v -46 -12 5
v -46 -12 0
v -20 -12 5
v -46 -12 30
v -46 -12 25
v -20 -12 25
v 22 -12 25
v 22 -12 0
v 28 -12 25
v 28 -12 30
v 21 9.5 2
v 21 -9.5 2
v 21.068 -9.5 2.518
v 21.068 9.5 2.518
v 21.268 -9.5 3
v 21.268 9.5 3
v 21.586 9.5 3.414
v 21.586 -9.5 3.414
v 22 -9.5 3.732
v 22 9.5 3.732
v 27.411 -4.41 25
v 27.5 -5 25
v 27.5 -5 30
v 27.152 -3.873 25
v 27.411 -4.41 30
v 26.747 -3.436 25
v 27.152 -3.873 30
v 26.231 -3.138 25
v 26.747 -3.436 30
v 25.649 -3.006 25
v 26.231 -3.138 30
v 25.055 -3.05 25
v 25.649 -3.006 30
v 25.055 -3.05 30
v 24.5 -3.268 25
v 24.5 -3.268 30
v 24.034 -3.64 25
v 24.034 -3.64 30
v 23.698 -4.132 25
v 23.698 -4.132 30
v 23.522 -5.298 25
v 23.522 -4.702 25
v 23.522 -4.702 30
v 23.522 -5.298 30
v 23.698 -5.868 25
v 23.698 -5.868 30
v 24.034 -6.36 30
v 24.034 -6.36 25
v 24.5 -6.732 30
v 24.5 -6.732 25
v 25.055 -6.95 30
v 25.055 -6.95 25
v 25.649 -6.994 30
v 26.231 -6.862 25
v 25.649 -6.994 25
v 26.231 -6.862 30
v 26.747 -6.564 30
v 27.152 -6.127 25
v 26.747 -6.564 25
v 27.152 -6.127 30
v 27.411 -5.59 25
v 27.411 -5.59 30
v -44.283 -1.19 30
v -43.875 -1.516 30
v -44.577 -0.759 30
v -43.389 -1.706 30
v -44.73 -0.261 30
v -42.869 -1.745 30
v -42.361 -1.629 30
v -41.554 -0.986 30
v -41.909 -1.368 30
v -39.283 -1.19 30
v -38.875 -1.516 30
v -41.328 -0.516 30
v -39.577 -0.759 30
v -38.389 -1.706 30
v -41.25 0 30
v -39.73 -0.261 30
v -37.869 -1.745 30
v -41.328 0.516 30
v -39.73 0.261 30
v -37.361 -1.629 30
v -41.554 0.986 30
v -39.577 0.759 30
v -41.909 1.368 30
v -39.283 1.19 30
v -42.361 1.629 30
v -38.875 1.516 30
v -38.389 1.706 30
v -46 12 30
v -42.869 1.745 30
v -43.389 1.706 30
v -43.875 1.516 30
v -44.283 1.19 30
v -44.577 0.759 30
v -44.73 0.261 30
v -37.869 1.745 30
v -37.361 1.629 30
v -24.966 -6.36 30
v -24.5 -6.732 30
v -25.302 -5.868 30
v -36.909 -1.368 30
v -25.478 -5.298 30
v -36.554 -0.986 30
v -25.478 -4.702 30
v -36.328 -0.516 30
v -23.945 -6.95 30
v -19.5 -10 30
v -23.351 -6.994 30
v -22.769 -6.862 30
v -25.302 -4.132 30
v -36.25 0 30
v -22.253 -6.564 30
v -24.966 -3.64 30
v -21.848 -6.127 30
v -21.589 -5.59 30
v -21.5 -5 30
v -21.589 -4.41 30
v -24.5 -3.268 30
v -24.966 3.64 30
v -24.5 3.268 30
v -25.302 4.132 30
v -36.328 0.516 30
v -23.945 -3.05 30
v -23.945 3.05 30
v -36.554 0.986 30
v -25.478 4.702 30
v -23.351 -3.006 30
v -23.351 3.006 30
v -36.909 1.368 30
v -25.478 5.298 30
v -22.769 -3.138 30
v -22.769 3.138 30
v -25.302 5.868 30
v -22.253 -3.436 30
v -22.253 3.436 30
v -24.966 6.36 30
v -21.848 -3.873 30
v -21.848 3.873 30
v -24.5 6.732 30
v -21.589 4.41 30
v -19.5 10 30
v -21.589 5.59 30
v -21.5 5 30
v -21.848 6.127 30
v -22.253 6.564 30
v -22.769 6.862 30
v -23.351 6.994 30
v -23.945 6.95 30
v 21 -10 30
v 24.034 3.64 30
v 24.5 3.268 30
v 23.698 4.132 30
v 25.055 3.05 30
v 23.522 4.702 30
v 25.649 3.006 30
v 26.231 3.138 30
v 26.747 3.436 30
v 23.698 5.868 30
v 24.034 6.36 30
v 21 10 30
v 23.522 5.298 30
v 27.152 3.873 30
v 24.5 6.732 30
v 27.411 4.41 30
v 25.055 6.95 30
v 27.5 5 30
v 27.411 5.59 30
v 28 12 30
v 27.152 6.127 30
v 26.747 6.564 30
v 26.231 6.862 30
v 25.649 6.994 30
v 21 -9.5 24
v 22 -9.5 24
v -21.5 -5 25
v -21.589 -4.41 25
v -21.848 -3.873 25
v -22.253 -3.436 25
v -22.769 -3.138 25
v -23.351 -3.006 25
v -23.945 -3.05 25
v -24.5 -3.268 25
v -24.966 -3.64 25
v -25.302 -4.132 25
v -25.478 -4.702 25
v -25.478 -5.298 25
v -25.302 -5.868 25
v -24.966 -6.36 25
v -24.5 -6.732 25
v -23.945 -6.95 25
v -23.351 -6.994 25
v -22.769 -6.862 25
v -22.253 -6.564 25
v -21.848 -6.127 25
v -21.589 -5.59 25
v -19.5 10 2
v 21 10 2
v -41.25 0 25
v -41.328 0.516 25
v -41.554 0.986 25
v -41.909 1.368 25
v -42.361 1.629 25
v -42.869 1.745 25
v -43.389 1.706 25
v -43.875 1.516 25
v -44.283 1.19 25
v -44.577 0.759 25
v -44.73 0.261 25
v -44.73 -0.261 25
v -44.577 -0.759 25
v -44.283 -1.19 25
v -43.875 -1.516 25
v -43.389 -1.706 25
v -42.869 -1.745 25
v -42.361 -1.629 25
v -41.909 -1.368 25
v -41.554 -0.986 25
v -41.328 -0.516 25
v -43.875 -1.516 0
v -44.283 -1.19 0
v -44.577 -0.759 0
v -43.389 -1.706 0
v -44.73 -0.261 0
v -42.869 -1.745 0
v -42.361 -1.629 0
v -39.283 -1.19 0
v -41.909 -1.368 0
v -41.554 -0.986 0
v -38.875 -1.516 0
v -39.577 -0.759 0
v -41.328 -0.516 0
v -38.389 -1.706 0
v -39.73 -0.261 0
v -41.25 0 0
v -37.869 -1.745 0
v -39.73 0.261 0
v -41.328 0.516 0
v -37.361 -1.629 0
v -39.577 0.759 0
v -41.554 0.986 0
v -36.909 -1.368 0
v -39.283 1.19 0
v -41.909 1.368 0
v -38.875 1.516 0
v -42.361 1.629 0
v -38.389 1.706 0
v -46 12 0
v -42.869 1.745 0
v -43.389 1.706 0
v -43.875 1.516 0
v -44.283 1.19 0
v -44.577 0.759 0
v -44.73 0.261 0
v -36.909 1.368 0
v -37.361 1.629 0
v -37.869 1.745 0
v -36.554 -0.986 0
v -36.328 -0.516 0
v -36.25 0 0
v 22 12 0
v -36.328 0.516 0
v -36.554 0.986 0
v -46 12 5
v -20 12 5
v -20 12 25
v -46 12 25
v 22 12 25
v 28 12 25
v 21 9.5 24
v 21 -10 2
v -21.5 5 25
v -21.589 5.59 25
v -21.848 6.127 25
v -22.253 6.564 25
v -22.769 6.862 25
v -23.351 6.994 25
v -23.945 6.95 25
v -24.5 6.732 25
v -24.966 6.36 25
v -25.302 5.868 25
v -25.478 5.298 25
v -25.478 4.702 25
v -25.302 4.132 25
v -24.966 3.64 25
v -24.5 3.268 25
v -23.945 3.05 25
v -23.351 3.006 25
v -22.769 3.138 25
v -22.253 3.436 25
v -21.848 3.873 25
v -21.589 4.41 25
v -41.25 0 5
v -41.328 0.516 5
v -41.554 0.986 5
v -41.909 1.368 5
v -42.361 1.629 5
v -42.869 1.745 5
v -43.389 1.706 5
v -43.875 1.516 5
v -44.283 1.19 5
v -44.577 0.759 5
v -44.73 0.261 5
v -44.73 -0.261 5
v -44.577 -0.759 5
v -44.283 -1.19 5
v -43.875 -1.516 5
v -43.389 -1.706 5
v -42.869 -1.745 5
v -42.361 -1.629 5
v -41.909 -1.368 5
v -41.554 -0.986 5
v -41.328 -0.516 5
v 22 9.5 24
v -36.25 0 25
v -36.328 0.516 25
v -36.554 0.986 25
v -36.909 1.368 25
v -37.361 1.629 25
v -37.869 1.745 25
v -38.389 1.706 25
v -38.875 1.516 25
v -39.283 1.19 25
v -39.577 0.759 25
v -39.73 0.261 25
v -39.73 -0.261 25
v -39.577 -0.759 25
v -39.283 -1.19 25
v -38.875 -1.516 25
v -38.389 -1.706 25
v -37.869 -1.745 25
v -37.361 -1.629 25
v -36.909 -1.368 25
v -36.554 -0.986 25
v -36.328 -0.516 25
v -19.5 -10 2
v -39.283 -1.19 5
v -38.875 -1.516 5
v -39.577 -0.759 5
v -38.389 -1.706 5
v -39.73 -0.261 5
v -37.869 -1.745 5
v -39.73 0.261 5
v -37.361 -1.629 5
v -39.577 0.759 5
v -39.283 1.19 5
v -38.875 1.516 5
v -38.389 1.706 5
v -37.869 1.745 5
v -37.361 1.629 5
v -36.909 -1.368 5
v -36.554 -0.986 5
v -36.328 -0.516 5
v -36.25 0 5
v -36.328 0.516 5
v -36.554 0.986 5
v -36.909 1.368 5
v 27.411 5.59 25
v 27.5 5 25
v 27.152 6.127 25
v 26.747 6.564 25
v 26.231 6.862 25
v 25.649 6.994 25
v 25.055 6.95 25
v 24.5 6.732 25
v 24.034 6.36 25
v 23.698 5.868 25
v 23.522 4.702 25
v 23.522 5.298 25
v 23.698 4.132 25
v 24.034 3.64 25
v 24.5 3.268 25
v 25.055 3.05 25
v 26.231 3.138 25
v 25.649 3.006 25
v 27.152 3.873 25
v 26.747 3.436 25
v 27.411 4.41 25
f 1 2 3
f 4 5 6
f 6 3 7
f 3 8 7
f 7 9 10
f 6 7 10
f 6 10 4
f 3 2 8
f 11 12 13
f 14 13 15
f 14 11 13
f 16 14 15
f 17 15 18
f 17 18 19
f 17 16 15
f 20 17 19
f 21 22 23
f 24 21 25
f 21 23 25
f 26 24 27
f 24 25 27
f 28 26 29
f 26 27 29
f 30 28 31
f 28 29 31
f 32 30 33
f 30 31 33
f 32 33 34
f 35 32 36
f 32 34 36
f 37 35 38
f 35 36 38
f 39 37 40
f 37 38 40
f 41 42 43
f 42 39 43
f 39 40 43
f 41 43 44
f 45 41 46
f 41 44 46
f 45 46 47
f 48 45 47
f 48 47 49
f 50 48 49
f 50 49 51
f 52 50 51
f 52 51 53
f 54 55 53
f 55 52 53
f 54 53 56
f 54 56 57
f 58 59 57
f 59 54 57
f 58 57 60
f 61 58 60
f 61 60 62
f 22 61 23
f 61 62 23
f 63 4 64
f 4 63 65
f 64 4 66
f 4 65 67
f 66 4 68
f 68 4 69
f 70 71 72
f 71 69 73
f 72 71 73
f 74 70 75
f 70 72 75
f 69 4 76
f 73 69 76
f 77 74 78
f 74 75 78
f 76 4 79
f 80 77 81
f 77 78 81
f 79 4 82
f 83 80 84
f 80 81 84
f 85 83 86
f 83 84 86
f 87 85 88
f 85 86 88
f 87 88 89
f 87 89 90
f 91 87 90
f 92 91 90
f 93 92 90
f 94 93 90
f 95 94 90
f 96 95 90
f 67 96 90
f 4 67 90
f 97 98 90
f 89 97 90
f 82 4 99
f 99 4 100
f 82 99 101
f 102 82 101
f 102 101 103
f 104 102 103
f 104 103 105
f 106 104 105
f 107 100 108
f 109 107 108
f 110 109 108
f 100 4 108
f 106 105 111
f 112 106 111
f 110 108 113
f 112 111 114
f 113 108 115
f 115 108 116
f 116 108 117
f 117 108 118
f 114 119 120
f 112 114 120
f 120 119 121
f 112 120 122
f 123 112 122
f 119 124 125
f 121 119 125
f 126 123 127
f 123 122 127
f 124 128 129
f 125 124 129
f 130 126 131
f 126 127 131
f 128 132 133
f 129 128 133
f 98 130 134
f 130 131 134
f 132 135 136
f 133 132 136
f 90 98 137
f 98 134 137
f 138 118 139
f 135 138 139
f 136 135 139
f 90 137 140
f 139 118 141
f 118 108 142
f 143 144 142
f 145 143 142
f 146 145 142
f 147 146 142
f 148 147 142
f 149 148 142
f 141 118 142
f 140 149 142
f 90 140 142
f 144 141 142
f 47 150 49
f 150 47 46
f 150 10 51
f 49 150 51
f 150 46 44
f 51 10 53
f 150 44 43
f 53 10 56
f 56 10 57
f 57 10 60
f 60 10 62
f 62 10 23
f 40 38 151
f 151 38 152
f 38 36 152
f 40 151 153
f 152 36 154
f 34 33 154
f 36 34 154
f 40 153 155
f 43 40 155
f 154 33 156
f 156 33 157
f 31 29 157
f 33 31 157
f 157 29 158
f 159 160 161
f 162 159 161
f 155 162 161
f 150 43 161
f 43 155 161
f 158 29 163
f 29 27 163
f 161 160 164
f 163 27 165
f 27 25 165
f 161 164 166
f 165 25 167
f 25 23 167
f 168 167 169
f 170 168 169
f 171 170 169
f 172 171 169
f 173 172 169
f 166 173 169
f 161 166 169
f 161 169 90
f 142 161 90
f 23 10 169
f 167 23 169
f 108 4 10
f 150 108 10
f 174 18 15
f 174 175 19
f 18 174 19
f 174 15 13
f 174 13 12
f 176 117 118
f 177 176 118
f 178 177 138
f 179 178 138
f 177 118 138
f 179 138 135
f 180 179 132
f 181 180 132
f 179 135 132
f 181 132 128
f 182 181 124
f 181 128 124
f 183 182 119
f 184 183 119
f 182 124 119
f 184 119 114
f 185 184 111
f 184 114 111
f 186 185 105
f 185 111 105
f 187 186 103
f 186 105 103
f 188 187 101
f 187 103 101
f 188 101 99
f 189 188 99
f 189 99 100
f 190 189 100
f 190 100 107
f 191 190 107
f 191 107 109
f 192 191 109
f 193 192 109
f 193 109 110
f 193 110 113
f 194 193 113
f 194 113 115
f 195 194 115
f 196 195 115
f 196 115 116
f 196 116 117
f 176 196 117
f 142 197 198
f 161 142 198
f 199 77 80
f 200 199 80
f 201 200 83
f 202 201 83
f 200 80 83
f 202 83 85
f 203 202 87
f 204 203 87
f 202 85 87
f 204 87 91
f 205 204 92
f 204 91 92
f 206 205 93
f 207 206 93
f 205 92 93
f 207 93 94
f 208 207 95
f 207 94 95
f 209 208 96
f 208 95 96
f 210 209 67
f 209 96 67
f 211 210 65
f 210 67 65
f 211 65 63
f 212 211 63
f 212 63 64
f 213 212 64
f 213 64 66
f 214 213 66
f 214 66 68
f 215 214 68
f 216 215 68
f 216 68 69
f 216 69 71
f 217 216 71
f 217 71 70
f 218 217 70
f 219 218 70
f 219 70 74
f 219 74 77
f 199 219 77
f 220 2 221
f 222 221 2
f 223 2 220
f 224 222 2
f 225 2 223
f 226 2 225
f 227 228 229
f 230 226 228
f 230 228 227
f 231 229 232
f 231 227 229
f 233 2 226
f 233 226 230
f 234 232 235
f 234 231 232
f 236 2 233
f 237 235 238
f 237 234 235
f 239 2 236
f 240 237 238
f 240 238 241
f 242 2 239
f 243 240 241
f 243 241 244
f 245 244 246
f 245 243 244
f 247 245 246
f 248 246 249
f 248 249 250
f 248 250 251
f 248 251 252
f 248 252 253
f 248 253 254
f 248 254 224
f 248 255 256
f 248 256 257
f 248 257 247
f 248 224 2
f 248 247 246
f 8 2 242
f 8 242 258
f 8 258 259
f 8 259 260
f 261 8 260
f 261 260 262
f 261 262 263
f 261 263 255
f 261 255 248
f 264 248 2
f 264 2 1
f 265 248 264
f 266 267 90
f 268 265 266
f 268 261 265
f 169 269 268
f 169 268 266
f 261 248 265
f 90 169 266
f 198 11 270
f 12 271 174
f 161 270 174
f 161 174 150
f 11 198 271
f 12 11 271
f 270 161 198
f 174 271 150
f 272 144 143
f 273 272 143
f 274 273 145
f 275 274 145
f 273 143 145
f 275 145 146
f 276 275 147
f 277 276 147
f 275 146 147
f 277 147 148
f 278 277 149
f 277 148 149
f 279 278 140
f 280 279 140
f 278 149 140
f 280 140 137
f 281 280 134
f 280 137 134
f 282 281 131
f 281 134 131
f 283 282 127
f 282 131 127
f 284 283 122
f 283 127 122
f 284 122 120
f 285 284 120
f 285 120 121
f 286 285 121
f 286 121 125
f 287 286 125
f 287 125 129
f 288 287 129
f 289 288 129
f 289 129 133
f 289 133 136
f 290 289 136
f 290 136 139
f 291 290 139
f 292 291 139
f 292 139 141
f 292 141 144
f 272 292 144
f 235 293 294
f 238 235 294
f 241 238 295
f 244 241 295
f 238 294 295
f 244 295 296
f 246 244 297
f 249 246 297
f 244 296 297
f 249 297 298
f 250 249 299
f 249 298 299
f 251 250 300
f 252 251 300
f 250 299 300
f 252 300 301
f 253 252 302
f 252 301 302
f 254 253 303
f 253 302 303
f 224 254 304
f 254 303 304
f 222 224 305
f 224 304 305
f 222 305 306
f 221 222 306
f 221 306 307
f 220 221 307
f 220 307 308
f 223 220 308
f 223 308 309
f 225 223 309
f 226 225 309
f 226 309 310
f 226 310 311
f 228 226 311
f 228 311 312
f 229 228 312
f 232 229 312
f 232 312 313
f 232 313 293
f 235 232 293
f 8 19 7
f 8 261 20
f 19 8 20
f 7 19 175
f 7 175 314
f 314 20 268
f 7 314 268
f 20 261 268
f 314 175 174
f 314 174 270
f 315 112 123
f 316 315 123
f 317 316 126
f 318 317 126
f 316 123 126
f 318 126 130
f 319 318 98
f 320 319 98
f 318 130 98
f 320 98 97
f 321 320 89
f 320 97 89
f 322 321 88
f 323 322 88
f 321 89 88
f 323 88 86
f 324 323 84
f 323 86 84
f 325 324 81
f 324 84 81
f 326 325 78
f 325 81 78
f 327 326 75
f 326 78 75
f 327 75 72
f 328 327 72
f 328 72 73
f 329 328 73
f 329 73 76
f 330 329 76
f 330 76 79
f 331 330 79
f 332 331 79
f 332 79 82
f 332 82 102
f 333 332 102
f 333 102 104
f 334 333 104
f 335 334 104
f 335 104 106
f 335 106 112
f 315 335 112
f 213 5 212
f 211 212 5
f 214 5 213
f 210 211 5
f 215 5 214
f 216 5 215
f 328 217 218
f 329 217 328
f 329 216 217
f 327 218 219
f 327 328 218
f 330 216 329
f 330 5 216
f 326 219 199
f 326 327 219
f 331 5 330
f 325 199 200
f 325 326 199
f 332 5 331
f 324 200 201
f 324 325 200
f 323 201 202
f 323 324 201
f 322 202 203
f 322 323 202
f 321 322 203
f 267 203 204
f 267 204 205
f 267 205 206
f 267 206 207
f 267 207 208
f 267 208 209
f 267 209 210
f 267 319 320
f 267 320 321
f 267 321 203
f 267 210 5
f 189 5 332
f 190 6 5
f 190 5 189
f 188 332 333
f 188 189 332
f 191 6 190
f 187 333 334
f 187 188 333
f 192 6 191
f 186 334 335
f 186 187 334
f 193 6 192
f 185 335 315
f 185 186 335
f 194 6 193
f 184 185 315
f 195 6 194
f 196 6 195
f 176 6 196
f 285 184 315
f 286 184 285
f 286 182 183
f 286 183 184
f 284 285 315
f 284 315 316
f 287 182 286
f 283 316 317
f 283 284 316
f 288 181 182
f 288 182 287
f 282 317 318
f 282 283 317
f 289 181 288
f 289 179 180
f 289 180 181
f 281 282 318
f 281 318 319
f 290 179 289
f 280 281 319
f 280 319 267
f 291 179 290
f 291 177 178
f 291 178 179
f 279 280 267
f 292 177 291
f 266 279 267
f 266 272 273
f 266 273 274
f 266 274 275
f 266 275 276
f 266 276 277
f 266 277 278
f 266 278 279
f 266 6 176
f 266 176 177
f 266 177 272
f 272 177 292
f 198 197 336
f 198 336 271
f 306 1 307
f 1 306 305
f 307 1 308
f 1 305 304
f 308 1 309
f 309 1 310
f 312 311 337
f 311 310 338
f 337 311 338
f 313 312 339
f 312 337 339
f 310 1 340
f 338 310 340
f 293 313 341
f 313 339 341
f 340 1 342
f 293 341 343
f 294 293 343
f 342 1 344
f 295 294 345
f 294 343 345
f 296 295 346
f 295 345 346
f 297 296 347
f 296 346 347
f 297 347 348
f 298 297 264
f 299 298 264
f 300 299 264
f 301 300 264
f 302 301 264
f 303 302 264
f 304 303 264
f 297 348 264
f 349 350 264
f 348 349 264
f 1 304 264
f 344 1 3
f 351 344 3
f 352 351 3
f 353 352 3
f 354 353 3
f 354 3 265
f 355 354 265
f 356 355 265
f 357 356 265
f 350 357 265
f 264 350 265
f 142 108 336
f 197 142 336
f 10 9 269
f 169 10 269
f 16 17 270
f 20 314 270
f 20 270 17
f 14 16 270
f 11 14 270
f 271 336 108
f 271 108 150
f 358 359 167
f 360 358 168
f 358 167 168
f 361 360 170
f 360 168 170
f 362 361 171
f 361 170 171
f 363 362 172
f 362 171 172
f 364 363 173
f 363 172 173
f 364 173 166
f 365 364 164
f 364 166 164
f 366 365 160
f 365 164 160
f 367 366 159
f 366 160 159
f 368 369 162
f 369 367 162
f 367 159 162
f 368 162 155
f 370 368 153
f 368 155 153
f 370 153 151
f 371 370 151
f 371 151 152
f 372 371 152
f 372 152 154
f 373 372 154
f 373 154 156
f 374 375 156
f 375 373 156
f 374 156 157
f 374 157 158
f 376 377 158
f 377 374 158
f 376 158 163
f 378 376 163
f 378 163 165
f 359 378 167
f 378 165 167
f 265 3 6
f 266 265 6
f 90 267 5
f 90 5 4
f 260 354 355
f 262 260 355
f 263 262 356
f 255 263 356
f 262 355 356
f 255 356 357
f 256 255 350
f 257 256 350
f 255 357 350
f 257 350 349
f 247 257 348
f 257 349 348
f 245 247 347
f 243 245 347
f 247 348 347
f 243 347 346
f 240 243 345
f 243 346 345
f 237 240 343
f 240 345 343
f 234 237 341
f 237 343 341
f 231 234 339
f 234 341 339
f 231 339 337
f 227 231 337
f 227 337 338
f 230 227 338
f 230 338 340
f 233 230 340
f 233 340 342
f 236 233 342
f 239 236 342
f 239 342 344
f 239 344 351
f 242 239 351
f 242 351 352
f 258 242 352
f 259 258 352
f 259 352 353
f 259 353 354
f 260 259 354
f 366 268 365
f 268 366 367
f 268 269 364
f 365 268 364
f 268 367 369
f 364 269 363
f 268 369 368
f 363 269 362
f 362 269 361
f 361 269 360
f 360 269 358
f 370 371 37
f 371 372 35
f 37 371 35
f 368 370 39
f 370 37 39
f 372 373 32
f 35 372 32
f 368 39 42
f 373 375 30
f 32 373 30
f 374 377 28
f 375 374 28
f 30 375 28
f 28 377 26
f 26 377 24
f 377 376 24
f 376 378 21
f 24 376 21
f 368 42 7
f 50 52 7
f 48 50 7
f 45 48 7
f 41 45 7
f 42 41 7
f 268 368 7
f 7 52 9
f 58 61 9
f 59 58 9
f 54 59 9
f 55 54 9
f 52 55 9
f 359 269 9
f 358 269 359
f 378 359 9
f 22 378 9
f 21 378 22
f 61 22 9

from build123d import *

# Parameters (mm, degrees)
SKETCH1_W                 = 56
SKETCH1_H                 = 24
BOSS_EXTRUDE1_DEPTH       = 30
SHELL1_T                  = -2
SHELL1_THICKNESS_2_FACE_W = 28
SHELL1_THICKNESS_2_FACE_H = 20
SHELL1_THICKNESS_2_DEPTH  = 6.5
SHELL1_THICKNESS_3_FACE_W = 28
SHELL1_THICKNESS_3_FACE_H = 20
SHELL1_THICKNESS_3_DEPTH  = 5
SKETCH12_W                = 20
SKETCH12_H                = 19
CUT_EXTRUDE1_DEPTH        = 10
FILLET1_R                 = 2
SKETCH13_W                = 2
SKETCH13_H                = 24
CUT_EXTRUDE2_DEPTH        = 43.755116653
SKETCH17_W                = 25
SKETCH17_H                = 24
CUT_EXTRUDE4_DEPTH        = 4
SKETCH19_R                = 2
CUT_EXTRUDE5_DEPTH        = 13
CUT_EXTRUDE7_DEPTH        = 2
SKETCH21_W                = 25
SKETCH21_H                = 24
CUT_EXTRUDE8_DEPTH        = 6
SKETCH26_W                = 5
SKETCH26_H                = 24
BOSS_EXTRUDE3_DEPTH       = 20
SKETCH27_W                = 5
SKETCH27_H                = 24
BOSS_EXTRUDE4_DEPTH       = 26
SKETCH28_R                = 1.75
CUT_EXTRUDE9_DEPTH        = 57.21387729


with BuildPart() as part:
    # Sketch1 → Boss-Extrude1 (new body)
    with BuildSketch(Plane.XY):
        Rectangle(SKETCH1_W, SKETCH1_H)
    extrude(amount=BOSS_EXTRUDE1_DEPTH)

    # Shell1
    shell1_openings = [part.faces().sort_by_distance(p)[0] for p in [
        (0, 0, 30),
    ]]
    offset(amount=SHELL1_T, openings=shell1_openings, kind=Kind.INTERSECTION)

    # Shell1 thickness 2 face (on inner face of the shell) → Shell1 thickness 2 (add)
    with BuildSketch(Plane(origin=(-26, 0, 16), x_dir=(0, 0, -1), z_dir=(-1, 0, 0))):
        Rectangle(SHELL1_THICKNESS_2_FACE_W, SHELL1_THICKNESS_2_FACE_H)
    extrude(amount=-SHELL1_THICKNESS_2_DEPTH)

    # Shell1 thickness 3 face (on inner face of the shell) → Shell1 thickness 3 (add)
    with BuildSketch(Plane(origin=(26, 0, 16), x_dir=(0, 0, 1), z_dir=(1, 0, 0))):
        Rectangle(SHELL1_THICKNESS_3_FACE_W, SHELL1_THICKNESS_3_FACE_H)
    extrude(amount=-SHELL1_THICKNESS_3_DEPTH)

    # Sketch12 → Cut-Extrude1 (cut)
    with BuildSketch(Plane(origin=(28, 0, 0), x_dir=(0, 0, -1), z_dir=(1, 0, 0))):
        with Locations((-14, 0)):
            Rectangle(SKETCH12_W, SKETCH12_H)
    extrude(amount=-CUT_EXTRUDE1_DEPTH, mode=Mode.SUBTRACT)

    # Fillet1
    fillet1_edges = [part.edges().sort_by_distance(p)[0] for p in [
        (21, 0, 4),
    ]]
    fillet(fillet1_edges, radius=FILLET1_R - 0.0001)  # a hair under: the kernel refuses the full size

    # Sketch13 → Cut-Extrude2 (cut, through all)
    with BuildSketch(Plane.XY.offset(30)):
        with Locations((-27, 0)):
            Rectangle(SKETCH13_W, SKETCH13_H)
    extrude(amount=-CUT_EXTRUDE2_DEPTH, mode=Mode.SUBTRACT)

    # Sketch17 → Cut-Extrude4 (cut)
    with BuildSketch(Plane(origin=(28, 0, 0), x_dir=(0, 0, -1), z_dir=(1, 0, 0))):
        with Locations((-12.5, 0)):
            Rectangle(SKETCH17_W, SKETCH17_H)
    extrude(amount=-CUT_EXTRUDE4_DEPTH, mode=Mode.SUBTRACT)

    # Sketch19 → Cut-Extrude5 (cut)
    with BuildSketch(Plane.XY.offset(30)):
        with Locations((-23.5, -5)):
            Circle(SKETCH19_R)
        with Locations((-23.5, 5)):
            Circle(SKETCH19_R)
        with Locations((25.5, 5)):
            Circle(SKETCH19_R)
        with Locations((25.5, -5)):
            Circle(SKETCH19_R)
    extrude(amount=-CUT_EXTRUDE5_DEPTH, mode=Mode.SUBTRACT)

    # Sketch20 → Cut-Extrude7 (cut)
    with BuildSketch(Plane(origin=(24, 0, 0), x_dir=(0, 0, -1), z_dir=(1, 0, 0))):
        Polygon((-25, 6.322875656), (-25, 12), (0, 12), (0, -12), (-25, -12), (-25, -6.322875656), align=None)
        Polygon((-24, -6.322875656), (-24, -9.5), (-4, -9.5), (-4, 9.5), (-24, 9.5), (-24, 6.322875656), align=None, mode=Mode.SUBTRACT)
    extrude(amount=-CUT_EXTRUDE7_DEPTH, mode=Mode.SUBTRACT)

    # Sketch21 → Cut-Extrude8 (cut)
    with BuildSketch(Plane.ZY.offset(26)):
        with Locations((12.5, 0)):
            Rectangle(SKETCH21_W, SKETCH21_H)
    extrude(amount=-CUT_EXTRUDE8_DEPTH, mode=Mode.SUBTRACT)

    # Sketch26 → Boss-Extrude3 (add)
    with BuildSketch(Plane.ZY.offset(26)):
        with Locations((27.5, 0)):
            Rectangle(SKETCH26_W, SKETCH26_H)
    extrude(amount=BOSS_EXTRUDE3_DEPTH)

    # Sketch27 → Boss-Extrude4 (add)
    with BuildSketch(Plane.ZY.offset(20)):
        with Locations((2.5, 0)):
            Rectangle(SKETCH27_W, SKETCH27_H)
    extrude(amount=BOSS_EXTRUDE4_DEPTH)

    # Sketch28 → Cut-Extrude9 (cut, through all)
    with BuildSketch(Plane.XY.offset(30)):
        with Locations((-43, 0)):
            Circle(SKETCH28_R)
        with Locations((-38, 0)):
            Circle(SKETCH28_R)
    extrude(amount=-CUT_EXTRUDE9_DEPTH, mode=Mode.SUBTRACT)


solid = part.part
